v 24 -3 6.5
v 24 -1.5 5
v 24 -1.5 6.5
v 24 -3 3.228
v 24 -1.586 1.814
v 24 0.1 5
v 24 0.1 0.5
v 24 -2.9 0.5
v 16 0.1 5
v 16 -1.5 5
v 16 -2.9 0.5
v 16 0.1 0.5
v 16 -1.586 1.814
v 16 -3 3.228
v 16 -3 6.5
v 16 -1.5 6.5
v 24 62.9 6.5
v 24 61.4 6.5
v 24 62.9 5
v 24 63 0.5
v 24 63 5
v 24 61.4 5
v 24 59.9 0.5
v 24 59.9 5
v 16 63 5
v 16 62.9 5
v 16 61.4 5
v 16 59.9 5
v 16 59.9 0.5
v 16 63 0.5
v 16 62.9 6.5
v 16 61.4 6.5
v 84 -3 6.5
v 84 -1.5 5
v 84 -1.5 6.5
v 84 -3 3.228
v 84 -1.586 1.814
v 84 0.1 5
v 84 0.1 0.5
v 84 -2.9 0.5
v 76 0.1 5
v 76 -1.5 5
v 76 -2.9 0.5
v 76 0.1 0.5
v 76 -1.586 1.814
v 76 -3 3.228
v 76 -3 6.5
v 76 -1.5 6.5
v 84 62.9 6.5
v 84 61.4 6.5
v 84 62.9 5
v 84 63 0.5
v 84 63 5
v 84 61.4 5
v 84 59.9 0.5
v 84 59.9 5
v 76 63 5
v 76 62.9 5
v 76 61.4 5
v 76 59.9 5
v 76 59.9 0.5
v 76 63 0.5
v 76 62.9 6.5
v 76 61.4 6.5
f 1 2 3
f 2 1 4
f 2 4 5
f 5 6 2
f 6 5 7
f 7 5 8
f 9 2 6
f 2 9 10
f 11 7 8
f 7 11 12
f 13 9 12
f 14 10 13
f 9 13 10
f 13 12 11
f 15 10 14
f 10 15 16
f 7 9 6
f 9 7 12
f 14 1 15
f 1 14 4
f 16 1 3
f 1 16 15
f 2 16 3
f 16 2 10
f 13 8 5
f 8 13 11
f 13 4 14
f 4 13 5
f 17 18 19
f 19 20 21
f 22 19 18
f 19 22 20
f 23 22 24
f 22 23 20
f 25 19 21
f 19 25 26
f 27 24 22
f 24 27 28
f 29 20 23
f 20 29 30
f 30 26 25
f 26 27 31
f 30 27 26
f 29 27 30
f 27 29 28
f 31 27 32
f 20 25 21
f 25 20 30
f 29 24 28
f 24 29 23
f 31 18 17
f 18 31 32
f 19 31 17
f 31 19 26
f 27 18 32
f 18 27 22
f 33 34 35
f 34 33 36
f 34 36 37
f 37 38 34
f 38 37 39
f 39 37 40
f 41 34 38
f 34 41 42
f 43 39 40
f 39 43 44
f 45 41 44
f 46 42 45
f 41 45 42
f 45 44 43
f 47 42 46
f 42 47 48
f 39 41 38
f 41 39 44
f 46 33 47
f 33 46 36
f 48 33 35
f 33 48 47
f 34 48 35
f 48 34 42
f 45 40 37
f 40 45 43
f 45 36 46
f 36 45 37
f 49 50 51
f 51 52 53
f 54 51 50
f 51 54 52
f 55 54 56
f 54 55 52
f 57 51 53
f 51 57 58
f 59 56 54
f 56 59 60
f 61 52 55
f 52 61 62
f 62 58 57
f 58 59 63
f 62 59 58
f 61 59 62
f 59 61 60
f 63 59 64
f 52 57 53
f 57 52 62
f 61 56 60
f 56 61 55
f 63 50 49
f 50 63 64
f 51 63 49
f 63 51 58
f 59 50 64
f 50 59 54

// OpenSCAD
// =============================================================================
// OpenMotorBridge - Satellite Pod: 4x EPDM Strap Hook Lugs (Einhängenasen)
// =============================================================================
// File: hardware/cad/scad/02_pod_base/parts/005_pod_strap_hooks.scad
// Description: 4 integrated side hook lugs for toolless EPDM rubber ring &
//              ladder strap attachment on motorcycle frame tubes and crash bars.
// =============================================================================

module pod_strap_hook_lugs(length=100.0, width=60.0, hook_w=8.0, hook_out=3.0, hook_h=4.5) {
    // 4 Hook locations: 2 on Left flank (y = 0), 2 on Right flank (y = width)
    x_positions = [20.0, 80.0];

    for (x = x_positions) {
        // Left Flank Hooks (y = 0, pointing up +Z)
        translate([x - hook_w/2.0, -hook_out, 0.5]) {
            difference() {
                union() {
                    // Base protrusion
                    cube([hook_w, hook_out + 0.1, hook_h], center=false);
                    // Upward retaining lip
                    translate([0, 0, hook_h - 1.0])
                        cube([hook_w, 1.5, 2.5], center=false);
                }
                // Chamfer bottom edge
                translate([-0.1, 0, -0.1])
                    rotate([45, 0, 0])
                        cube([hook_w + 0.2, 2.0, 2.0], center=false);
            }
        }

        // Right Flank Hooks (y = width, pointing up +Z)
        translate([x - hook_w/2.0, width - 0.1, 0.5]) {
            difference() {
                union() {
                    // Base protrusion
                    cube([hook_w, hook_out + 0.1, hook_h], center=false);
                    // Upward retaining lip
                    translate([0, hook_out - 1.5, hook_h - 1.0])
                        cube([hook_w, 1.5, 2.5], center=false);
                }
                // Chamfer bottom edge
                translate([-0.1, hook_out, -0.1])
                    rotate([-45, 0, 0])
                        cube([hook_w + 0.2, 2.0, 2.0], center=false);
            }
        }
    }
}

// Standalone preview
pod_strap_hook_lugs();
